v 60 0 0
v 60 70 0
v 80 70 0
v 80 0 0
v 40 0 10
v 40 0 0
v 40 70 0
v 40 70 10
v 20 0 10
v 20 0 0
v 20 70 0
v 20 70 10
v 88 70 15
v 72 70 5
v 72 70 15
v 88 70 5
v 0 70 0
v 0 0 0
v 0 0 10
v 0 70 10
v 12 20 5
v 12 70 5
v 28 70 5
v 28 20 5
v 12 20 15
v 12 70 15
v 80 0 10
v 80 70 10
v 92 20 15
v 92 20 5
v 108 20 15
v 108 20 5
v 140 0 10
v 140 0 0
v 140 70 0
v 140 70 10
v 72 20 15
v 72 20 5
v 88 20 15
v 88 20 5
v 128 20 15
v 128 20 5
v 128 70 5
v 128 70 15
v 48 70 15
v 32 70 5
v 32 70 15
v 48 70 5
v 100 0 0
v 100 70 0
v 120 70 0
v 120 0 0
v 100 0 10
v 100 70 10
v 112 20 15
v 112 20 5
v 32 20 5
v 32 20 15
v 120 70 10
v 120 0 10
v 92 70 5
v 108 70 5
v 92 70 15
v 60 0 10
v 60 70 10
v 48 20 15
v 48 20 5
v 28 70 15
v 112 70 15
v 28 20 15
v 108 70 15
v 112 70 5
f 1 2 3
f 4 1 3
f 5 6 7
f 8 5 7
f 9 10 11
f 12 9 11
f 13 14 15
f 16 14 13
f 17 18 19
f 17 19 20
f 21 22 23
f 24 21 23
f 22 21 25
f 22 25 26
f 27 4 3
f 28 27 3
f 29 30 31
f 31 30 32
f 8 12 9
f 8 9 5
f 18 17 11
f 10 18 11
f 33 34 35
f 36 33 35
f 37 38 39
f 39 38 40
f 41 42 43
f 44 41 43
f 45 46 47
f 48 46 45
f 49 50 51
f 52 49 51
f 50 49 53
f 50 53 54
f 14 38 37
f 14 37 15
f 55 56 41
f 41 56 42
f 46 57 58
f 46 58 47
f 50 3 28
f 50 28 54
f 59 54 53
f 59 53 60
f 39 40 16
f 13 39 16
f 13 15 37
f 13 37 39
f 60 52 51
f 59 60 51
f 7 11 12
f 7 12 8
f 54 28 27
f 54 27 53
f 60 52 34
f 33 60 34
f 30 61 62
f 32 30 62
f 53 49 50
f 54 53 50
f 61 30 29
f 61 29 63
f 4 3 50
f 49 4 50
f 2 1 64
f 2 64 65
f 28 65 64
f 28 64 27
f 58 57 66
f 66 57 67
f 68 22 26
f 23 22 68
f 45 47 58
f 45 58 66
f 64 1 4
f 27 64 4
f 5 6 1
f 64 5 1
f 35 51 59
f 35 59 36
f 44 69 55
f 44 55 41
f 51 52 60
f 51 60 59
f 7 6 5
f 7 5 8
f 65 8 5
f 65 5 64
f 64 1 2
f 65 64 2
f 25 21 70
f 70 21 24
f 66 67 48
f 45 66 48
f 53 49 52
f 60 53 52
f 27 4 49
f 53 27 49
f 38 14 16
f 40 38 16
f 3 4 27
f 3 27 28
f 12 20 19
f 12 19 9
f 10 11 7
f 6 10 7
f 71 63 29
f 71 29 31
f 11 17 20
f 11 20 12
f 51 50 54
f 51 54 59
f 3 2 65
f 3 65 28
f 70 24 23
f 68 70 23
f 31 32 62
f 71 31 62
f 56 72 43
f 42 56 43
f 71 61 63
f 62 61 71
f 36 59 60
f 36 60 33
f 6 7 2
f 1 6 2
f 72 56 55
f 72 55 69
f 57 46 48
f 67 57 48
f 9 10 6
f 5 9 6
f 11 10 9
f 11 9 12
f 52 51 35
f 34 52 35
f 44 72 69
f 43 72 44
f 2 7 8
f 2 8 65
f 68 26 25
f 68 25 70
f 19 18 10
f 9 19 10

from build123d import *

# Parameters (mm, degrees)
BOX_W        = 20
BOX_H        = 70
BOX_DEPTH    = 10
BOX001_W     = 20
BOX001_H     = 70
BOX001_DEPTH = 10
BOX002_W     = 20
BOX002_H     = 70
BOX002_DEPTH = 10
BOX003_W     = 20
BOX003_H     = 70
BOX003_DEPTH = 10
BOX004_W     = 20
BOX004_H     = 70
BOX004_DEPTH = 10
BOX005_W     = 20
BOX005_H     = 70
BOX005_DEPTH = 10
BOX006_W     = 20
BOX006_H     = 70
BOX006_DEPTH = 10
BOX007_W     = 16
BOX007_H     = 50
BOX007_DEPTH = 10
BOX008_W     = 16
BOX008_H     = 50
BOX008_DEPTH = 10
BOX009_W     = 16
BOX009_H     = 50
BOX009_DEPTH = 10
BOX010_W     = 16
BOX010_H     = 50
BOX010_DEPTH = 10
BOX011_W     = 16
BOX011_H     = 50
BOX011_DEPTH = 10


with BuildPart() as c:
    # Box → Box (new body)
    with BuildSketch(Plane.XY):
        with Locations((10, 35)):
            Rectangle(BOX_W, BOX_H)
    extrude(amount=BOX_DEPTH)


with BuildPart() as d:
    # Box001 → Box001 (new body)
    with BuildSketch(Plane(origin=(20, 0, 0), x_dir=(1, 0, 0), z_dir=(0, 0, 1))):
        with Locations((10, 35)):
            Rectangle(BOX001_W, BOX001_H)
    extrude(amount=BOX001_DEPTH)


with BuildPart() as e:
    # Box002 → Box002 (new body)
    with BuildSketch(Plane(origin=(40, 0, 0), x_dir=(1, 0, 0), z_dir=(0, 0, 1))):
        with Locations((10, 35)):
            Rectangle(BOX002_W, BOX002_H)
    extrude(amount=BOX002_DEPTH)


with BuildPart() as f:
    # Box003 → Box003 (new body)
    with BuildSketch(Plane(origin=(60, 0, 0), x_dir=(1, 0, 0), z_dir=(0, 0, 1))):
        with Locations((10, 35)):
            Rectangle(BOX003_W, BOX003_H)
    extrude(amount=BOX003_DEPTH)


with BuildPart() as g:
    # Box004 → Box004 (new body)
    with BuildSketch(Plane(origin=(80, 0, 0), x_dir=(1, 0, 0), z_dir=(0, 0, 1))):
        with Locations((10, 35)):
            Rectangle(BOX004_W, BOX004_H)
    extrude(amount=BOX004_DEPTH)


with BuildPart() as a:
    # Box005 → Box005 (new body)
    with BuildSketch(Plane(origin=(100, 0, 0), x_dir=(1, 0, 0), z_dir=(0, 0, 1))):
        with Locations((10, 35)):
            Rectangle(BOX005_W, BOX005_H)
    extrude(amount=BOX005_DEPTH)


with BuildPart() as b:
    # Box006 → Box006 (new body)
    with BuildSketch(Plane(origin=(120, 0, 0), x_dir=(1, 0, 0), z_dir=(0, 0, 1))):
        with Locations((10, 35)):
            Rectangle(BOX006_W, BOX006_H)
    extrude(amount=BOX006_DEPTH)


with BuildPart() as box007:
    # Box007 → Box007 (new body)
    with BuildSketch(Plane(origin=(12, 20, 5), x_dir=(1, 0, 0), z_dir=(0, 0, 1))):
        with Locations((8, 25)):
            Rectangle(BOX007_W, BOX007_H)
    extrude(amount=BOX007_DEPTH)


with BuildPart() as box008:
    # Box008 → Box008 (new body)
    with BuildSketch(Plane(origin=(32, 20, 5), x_dir=(1, 0, 0), z_dir=(0, 0, 1))):
        with Locations((8, 25)):
            Rectangle(BOX008_W, BOX008_H)
    extrude(amount=BOX008_DEPTH)


with BuildPart() as box009:
    # Box009 → Box009 (new body)
    with BuildSketch(Plane(origin=(72, 20, 5), x_dir=(1, 0, 0), z_dir=(0, 0, 1))):
        with Locations((8, 25)):
            Rectangle(BOX009_W, BOX009_H)
    extrude(amount=BOX009_DEPTH)


with BuildPart() as box010:
    # Box010 → Box010 (new body)
    with BuildSketch(Plane(origin=(92, 20, 5), x_dir=(1, 0, 0), z_dir=(0, 0, 1))):
        with Locations((8, 25)):
            Rectangle(BOX010_W, BOX010_H)
    extrude(amount=BOX010_DEPTH)


with BuildPart() as box011:
    # Box011 → Box011 (new body)
    with BuildSketch(Plane(origin=(112, 20, 5), x_dir=(1, 0, 0), z_dir=(0, 0, 1))):
        with Locations((8, 25)):
            Rectangle(BOX011_W, BOX011_H)
    extrude(amount=BOX011_DEPTH)


solid = Compound([c.part, d.part, e.part, f.part, g.part, a.part, b.part, box007.part, box008.part, box009.part, box010.part, box011.part])
